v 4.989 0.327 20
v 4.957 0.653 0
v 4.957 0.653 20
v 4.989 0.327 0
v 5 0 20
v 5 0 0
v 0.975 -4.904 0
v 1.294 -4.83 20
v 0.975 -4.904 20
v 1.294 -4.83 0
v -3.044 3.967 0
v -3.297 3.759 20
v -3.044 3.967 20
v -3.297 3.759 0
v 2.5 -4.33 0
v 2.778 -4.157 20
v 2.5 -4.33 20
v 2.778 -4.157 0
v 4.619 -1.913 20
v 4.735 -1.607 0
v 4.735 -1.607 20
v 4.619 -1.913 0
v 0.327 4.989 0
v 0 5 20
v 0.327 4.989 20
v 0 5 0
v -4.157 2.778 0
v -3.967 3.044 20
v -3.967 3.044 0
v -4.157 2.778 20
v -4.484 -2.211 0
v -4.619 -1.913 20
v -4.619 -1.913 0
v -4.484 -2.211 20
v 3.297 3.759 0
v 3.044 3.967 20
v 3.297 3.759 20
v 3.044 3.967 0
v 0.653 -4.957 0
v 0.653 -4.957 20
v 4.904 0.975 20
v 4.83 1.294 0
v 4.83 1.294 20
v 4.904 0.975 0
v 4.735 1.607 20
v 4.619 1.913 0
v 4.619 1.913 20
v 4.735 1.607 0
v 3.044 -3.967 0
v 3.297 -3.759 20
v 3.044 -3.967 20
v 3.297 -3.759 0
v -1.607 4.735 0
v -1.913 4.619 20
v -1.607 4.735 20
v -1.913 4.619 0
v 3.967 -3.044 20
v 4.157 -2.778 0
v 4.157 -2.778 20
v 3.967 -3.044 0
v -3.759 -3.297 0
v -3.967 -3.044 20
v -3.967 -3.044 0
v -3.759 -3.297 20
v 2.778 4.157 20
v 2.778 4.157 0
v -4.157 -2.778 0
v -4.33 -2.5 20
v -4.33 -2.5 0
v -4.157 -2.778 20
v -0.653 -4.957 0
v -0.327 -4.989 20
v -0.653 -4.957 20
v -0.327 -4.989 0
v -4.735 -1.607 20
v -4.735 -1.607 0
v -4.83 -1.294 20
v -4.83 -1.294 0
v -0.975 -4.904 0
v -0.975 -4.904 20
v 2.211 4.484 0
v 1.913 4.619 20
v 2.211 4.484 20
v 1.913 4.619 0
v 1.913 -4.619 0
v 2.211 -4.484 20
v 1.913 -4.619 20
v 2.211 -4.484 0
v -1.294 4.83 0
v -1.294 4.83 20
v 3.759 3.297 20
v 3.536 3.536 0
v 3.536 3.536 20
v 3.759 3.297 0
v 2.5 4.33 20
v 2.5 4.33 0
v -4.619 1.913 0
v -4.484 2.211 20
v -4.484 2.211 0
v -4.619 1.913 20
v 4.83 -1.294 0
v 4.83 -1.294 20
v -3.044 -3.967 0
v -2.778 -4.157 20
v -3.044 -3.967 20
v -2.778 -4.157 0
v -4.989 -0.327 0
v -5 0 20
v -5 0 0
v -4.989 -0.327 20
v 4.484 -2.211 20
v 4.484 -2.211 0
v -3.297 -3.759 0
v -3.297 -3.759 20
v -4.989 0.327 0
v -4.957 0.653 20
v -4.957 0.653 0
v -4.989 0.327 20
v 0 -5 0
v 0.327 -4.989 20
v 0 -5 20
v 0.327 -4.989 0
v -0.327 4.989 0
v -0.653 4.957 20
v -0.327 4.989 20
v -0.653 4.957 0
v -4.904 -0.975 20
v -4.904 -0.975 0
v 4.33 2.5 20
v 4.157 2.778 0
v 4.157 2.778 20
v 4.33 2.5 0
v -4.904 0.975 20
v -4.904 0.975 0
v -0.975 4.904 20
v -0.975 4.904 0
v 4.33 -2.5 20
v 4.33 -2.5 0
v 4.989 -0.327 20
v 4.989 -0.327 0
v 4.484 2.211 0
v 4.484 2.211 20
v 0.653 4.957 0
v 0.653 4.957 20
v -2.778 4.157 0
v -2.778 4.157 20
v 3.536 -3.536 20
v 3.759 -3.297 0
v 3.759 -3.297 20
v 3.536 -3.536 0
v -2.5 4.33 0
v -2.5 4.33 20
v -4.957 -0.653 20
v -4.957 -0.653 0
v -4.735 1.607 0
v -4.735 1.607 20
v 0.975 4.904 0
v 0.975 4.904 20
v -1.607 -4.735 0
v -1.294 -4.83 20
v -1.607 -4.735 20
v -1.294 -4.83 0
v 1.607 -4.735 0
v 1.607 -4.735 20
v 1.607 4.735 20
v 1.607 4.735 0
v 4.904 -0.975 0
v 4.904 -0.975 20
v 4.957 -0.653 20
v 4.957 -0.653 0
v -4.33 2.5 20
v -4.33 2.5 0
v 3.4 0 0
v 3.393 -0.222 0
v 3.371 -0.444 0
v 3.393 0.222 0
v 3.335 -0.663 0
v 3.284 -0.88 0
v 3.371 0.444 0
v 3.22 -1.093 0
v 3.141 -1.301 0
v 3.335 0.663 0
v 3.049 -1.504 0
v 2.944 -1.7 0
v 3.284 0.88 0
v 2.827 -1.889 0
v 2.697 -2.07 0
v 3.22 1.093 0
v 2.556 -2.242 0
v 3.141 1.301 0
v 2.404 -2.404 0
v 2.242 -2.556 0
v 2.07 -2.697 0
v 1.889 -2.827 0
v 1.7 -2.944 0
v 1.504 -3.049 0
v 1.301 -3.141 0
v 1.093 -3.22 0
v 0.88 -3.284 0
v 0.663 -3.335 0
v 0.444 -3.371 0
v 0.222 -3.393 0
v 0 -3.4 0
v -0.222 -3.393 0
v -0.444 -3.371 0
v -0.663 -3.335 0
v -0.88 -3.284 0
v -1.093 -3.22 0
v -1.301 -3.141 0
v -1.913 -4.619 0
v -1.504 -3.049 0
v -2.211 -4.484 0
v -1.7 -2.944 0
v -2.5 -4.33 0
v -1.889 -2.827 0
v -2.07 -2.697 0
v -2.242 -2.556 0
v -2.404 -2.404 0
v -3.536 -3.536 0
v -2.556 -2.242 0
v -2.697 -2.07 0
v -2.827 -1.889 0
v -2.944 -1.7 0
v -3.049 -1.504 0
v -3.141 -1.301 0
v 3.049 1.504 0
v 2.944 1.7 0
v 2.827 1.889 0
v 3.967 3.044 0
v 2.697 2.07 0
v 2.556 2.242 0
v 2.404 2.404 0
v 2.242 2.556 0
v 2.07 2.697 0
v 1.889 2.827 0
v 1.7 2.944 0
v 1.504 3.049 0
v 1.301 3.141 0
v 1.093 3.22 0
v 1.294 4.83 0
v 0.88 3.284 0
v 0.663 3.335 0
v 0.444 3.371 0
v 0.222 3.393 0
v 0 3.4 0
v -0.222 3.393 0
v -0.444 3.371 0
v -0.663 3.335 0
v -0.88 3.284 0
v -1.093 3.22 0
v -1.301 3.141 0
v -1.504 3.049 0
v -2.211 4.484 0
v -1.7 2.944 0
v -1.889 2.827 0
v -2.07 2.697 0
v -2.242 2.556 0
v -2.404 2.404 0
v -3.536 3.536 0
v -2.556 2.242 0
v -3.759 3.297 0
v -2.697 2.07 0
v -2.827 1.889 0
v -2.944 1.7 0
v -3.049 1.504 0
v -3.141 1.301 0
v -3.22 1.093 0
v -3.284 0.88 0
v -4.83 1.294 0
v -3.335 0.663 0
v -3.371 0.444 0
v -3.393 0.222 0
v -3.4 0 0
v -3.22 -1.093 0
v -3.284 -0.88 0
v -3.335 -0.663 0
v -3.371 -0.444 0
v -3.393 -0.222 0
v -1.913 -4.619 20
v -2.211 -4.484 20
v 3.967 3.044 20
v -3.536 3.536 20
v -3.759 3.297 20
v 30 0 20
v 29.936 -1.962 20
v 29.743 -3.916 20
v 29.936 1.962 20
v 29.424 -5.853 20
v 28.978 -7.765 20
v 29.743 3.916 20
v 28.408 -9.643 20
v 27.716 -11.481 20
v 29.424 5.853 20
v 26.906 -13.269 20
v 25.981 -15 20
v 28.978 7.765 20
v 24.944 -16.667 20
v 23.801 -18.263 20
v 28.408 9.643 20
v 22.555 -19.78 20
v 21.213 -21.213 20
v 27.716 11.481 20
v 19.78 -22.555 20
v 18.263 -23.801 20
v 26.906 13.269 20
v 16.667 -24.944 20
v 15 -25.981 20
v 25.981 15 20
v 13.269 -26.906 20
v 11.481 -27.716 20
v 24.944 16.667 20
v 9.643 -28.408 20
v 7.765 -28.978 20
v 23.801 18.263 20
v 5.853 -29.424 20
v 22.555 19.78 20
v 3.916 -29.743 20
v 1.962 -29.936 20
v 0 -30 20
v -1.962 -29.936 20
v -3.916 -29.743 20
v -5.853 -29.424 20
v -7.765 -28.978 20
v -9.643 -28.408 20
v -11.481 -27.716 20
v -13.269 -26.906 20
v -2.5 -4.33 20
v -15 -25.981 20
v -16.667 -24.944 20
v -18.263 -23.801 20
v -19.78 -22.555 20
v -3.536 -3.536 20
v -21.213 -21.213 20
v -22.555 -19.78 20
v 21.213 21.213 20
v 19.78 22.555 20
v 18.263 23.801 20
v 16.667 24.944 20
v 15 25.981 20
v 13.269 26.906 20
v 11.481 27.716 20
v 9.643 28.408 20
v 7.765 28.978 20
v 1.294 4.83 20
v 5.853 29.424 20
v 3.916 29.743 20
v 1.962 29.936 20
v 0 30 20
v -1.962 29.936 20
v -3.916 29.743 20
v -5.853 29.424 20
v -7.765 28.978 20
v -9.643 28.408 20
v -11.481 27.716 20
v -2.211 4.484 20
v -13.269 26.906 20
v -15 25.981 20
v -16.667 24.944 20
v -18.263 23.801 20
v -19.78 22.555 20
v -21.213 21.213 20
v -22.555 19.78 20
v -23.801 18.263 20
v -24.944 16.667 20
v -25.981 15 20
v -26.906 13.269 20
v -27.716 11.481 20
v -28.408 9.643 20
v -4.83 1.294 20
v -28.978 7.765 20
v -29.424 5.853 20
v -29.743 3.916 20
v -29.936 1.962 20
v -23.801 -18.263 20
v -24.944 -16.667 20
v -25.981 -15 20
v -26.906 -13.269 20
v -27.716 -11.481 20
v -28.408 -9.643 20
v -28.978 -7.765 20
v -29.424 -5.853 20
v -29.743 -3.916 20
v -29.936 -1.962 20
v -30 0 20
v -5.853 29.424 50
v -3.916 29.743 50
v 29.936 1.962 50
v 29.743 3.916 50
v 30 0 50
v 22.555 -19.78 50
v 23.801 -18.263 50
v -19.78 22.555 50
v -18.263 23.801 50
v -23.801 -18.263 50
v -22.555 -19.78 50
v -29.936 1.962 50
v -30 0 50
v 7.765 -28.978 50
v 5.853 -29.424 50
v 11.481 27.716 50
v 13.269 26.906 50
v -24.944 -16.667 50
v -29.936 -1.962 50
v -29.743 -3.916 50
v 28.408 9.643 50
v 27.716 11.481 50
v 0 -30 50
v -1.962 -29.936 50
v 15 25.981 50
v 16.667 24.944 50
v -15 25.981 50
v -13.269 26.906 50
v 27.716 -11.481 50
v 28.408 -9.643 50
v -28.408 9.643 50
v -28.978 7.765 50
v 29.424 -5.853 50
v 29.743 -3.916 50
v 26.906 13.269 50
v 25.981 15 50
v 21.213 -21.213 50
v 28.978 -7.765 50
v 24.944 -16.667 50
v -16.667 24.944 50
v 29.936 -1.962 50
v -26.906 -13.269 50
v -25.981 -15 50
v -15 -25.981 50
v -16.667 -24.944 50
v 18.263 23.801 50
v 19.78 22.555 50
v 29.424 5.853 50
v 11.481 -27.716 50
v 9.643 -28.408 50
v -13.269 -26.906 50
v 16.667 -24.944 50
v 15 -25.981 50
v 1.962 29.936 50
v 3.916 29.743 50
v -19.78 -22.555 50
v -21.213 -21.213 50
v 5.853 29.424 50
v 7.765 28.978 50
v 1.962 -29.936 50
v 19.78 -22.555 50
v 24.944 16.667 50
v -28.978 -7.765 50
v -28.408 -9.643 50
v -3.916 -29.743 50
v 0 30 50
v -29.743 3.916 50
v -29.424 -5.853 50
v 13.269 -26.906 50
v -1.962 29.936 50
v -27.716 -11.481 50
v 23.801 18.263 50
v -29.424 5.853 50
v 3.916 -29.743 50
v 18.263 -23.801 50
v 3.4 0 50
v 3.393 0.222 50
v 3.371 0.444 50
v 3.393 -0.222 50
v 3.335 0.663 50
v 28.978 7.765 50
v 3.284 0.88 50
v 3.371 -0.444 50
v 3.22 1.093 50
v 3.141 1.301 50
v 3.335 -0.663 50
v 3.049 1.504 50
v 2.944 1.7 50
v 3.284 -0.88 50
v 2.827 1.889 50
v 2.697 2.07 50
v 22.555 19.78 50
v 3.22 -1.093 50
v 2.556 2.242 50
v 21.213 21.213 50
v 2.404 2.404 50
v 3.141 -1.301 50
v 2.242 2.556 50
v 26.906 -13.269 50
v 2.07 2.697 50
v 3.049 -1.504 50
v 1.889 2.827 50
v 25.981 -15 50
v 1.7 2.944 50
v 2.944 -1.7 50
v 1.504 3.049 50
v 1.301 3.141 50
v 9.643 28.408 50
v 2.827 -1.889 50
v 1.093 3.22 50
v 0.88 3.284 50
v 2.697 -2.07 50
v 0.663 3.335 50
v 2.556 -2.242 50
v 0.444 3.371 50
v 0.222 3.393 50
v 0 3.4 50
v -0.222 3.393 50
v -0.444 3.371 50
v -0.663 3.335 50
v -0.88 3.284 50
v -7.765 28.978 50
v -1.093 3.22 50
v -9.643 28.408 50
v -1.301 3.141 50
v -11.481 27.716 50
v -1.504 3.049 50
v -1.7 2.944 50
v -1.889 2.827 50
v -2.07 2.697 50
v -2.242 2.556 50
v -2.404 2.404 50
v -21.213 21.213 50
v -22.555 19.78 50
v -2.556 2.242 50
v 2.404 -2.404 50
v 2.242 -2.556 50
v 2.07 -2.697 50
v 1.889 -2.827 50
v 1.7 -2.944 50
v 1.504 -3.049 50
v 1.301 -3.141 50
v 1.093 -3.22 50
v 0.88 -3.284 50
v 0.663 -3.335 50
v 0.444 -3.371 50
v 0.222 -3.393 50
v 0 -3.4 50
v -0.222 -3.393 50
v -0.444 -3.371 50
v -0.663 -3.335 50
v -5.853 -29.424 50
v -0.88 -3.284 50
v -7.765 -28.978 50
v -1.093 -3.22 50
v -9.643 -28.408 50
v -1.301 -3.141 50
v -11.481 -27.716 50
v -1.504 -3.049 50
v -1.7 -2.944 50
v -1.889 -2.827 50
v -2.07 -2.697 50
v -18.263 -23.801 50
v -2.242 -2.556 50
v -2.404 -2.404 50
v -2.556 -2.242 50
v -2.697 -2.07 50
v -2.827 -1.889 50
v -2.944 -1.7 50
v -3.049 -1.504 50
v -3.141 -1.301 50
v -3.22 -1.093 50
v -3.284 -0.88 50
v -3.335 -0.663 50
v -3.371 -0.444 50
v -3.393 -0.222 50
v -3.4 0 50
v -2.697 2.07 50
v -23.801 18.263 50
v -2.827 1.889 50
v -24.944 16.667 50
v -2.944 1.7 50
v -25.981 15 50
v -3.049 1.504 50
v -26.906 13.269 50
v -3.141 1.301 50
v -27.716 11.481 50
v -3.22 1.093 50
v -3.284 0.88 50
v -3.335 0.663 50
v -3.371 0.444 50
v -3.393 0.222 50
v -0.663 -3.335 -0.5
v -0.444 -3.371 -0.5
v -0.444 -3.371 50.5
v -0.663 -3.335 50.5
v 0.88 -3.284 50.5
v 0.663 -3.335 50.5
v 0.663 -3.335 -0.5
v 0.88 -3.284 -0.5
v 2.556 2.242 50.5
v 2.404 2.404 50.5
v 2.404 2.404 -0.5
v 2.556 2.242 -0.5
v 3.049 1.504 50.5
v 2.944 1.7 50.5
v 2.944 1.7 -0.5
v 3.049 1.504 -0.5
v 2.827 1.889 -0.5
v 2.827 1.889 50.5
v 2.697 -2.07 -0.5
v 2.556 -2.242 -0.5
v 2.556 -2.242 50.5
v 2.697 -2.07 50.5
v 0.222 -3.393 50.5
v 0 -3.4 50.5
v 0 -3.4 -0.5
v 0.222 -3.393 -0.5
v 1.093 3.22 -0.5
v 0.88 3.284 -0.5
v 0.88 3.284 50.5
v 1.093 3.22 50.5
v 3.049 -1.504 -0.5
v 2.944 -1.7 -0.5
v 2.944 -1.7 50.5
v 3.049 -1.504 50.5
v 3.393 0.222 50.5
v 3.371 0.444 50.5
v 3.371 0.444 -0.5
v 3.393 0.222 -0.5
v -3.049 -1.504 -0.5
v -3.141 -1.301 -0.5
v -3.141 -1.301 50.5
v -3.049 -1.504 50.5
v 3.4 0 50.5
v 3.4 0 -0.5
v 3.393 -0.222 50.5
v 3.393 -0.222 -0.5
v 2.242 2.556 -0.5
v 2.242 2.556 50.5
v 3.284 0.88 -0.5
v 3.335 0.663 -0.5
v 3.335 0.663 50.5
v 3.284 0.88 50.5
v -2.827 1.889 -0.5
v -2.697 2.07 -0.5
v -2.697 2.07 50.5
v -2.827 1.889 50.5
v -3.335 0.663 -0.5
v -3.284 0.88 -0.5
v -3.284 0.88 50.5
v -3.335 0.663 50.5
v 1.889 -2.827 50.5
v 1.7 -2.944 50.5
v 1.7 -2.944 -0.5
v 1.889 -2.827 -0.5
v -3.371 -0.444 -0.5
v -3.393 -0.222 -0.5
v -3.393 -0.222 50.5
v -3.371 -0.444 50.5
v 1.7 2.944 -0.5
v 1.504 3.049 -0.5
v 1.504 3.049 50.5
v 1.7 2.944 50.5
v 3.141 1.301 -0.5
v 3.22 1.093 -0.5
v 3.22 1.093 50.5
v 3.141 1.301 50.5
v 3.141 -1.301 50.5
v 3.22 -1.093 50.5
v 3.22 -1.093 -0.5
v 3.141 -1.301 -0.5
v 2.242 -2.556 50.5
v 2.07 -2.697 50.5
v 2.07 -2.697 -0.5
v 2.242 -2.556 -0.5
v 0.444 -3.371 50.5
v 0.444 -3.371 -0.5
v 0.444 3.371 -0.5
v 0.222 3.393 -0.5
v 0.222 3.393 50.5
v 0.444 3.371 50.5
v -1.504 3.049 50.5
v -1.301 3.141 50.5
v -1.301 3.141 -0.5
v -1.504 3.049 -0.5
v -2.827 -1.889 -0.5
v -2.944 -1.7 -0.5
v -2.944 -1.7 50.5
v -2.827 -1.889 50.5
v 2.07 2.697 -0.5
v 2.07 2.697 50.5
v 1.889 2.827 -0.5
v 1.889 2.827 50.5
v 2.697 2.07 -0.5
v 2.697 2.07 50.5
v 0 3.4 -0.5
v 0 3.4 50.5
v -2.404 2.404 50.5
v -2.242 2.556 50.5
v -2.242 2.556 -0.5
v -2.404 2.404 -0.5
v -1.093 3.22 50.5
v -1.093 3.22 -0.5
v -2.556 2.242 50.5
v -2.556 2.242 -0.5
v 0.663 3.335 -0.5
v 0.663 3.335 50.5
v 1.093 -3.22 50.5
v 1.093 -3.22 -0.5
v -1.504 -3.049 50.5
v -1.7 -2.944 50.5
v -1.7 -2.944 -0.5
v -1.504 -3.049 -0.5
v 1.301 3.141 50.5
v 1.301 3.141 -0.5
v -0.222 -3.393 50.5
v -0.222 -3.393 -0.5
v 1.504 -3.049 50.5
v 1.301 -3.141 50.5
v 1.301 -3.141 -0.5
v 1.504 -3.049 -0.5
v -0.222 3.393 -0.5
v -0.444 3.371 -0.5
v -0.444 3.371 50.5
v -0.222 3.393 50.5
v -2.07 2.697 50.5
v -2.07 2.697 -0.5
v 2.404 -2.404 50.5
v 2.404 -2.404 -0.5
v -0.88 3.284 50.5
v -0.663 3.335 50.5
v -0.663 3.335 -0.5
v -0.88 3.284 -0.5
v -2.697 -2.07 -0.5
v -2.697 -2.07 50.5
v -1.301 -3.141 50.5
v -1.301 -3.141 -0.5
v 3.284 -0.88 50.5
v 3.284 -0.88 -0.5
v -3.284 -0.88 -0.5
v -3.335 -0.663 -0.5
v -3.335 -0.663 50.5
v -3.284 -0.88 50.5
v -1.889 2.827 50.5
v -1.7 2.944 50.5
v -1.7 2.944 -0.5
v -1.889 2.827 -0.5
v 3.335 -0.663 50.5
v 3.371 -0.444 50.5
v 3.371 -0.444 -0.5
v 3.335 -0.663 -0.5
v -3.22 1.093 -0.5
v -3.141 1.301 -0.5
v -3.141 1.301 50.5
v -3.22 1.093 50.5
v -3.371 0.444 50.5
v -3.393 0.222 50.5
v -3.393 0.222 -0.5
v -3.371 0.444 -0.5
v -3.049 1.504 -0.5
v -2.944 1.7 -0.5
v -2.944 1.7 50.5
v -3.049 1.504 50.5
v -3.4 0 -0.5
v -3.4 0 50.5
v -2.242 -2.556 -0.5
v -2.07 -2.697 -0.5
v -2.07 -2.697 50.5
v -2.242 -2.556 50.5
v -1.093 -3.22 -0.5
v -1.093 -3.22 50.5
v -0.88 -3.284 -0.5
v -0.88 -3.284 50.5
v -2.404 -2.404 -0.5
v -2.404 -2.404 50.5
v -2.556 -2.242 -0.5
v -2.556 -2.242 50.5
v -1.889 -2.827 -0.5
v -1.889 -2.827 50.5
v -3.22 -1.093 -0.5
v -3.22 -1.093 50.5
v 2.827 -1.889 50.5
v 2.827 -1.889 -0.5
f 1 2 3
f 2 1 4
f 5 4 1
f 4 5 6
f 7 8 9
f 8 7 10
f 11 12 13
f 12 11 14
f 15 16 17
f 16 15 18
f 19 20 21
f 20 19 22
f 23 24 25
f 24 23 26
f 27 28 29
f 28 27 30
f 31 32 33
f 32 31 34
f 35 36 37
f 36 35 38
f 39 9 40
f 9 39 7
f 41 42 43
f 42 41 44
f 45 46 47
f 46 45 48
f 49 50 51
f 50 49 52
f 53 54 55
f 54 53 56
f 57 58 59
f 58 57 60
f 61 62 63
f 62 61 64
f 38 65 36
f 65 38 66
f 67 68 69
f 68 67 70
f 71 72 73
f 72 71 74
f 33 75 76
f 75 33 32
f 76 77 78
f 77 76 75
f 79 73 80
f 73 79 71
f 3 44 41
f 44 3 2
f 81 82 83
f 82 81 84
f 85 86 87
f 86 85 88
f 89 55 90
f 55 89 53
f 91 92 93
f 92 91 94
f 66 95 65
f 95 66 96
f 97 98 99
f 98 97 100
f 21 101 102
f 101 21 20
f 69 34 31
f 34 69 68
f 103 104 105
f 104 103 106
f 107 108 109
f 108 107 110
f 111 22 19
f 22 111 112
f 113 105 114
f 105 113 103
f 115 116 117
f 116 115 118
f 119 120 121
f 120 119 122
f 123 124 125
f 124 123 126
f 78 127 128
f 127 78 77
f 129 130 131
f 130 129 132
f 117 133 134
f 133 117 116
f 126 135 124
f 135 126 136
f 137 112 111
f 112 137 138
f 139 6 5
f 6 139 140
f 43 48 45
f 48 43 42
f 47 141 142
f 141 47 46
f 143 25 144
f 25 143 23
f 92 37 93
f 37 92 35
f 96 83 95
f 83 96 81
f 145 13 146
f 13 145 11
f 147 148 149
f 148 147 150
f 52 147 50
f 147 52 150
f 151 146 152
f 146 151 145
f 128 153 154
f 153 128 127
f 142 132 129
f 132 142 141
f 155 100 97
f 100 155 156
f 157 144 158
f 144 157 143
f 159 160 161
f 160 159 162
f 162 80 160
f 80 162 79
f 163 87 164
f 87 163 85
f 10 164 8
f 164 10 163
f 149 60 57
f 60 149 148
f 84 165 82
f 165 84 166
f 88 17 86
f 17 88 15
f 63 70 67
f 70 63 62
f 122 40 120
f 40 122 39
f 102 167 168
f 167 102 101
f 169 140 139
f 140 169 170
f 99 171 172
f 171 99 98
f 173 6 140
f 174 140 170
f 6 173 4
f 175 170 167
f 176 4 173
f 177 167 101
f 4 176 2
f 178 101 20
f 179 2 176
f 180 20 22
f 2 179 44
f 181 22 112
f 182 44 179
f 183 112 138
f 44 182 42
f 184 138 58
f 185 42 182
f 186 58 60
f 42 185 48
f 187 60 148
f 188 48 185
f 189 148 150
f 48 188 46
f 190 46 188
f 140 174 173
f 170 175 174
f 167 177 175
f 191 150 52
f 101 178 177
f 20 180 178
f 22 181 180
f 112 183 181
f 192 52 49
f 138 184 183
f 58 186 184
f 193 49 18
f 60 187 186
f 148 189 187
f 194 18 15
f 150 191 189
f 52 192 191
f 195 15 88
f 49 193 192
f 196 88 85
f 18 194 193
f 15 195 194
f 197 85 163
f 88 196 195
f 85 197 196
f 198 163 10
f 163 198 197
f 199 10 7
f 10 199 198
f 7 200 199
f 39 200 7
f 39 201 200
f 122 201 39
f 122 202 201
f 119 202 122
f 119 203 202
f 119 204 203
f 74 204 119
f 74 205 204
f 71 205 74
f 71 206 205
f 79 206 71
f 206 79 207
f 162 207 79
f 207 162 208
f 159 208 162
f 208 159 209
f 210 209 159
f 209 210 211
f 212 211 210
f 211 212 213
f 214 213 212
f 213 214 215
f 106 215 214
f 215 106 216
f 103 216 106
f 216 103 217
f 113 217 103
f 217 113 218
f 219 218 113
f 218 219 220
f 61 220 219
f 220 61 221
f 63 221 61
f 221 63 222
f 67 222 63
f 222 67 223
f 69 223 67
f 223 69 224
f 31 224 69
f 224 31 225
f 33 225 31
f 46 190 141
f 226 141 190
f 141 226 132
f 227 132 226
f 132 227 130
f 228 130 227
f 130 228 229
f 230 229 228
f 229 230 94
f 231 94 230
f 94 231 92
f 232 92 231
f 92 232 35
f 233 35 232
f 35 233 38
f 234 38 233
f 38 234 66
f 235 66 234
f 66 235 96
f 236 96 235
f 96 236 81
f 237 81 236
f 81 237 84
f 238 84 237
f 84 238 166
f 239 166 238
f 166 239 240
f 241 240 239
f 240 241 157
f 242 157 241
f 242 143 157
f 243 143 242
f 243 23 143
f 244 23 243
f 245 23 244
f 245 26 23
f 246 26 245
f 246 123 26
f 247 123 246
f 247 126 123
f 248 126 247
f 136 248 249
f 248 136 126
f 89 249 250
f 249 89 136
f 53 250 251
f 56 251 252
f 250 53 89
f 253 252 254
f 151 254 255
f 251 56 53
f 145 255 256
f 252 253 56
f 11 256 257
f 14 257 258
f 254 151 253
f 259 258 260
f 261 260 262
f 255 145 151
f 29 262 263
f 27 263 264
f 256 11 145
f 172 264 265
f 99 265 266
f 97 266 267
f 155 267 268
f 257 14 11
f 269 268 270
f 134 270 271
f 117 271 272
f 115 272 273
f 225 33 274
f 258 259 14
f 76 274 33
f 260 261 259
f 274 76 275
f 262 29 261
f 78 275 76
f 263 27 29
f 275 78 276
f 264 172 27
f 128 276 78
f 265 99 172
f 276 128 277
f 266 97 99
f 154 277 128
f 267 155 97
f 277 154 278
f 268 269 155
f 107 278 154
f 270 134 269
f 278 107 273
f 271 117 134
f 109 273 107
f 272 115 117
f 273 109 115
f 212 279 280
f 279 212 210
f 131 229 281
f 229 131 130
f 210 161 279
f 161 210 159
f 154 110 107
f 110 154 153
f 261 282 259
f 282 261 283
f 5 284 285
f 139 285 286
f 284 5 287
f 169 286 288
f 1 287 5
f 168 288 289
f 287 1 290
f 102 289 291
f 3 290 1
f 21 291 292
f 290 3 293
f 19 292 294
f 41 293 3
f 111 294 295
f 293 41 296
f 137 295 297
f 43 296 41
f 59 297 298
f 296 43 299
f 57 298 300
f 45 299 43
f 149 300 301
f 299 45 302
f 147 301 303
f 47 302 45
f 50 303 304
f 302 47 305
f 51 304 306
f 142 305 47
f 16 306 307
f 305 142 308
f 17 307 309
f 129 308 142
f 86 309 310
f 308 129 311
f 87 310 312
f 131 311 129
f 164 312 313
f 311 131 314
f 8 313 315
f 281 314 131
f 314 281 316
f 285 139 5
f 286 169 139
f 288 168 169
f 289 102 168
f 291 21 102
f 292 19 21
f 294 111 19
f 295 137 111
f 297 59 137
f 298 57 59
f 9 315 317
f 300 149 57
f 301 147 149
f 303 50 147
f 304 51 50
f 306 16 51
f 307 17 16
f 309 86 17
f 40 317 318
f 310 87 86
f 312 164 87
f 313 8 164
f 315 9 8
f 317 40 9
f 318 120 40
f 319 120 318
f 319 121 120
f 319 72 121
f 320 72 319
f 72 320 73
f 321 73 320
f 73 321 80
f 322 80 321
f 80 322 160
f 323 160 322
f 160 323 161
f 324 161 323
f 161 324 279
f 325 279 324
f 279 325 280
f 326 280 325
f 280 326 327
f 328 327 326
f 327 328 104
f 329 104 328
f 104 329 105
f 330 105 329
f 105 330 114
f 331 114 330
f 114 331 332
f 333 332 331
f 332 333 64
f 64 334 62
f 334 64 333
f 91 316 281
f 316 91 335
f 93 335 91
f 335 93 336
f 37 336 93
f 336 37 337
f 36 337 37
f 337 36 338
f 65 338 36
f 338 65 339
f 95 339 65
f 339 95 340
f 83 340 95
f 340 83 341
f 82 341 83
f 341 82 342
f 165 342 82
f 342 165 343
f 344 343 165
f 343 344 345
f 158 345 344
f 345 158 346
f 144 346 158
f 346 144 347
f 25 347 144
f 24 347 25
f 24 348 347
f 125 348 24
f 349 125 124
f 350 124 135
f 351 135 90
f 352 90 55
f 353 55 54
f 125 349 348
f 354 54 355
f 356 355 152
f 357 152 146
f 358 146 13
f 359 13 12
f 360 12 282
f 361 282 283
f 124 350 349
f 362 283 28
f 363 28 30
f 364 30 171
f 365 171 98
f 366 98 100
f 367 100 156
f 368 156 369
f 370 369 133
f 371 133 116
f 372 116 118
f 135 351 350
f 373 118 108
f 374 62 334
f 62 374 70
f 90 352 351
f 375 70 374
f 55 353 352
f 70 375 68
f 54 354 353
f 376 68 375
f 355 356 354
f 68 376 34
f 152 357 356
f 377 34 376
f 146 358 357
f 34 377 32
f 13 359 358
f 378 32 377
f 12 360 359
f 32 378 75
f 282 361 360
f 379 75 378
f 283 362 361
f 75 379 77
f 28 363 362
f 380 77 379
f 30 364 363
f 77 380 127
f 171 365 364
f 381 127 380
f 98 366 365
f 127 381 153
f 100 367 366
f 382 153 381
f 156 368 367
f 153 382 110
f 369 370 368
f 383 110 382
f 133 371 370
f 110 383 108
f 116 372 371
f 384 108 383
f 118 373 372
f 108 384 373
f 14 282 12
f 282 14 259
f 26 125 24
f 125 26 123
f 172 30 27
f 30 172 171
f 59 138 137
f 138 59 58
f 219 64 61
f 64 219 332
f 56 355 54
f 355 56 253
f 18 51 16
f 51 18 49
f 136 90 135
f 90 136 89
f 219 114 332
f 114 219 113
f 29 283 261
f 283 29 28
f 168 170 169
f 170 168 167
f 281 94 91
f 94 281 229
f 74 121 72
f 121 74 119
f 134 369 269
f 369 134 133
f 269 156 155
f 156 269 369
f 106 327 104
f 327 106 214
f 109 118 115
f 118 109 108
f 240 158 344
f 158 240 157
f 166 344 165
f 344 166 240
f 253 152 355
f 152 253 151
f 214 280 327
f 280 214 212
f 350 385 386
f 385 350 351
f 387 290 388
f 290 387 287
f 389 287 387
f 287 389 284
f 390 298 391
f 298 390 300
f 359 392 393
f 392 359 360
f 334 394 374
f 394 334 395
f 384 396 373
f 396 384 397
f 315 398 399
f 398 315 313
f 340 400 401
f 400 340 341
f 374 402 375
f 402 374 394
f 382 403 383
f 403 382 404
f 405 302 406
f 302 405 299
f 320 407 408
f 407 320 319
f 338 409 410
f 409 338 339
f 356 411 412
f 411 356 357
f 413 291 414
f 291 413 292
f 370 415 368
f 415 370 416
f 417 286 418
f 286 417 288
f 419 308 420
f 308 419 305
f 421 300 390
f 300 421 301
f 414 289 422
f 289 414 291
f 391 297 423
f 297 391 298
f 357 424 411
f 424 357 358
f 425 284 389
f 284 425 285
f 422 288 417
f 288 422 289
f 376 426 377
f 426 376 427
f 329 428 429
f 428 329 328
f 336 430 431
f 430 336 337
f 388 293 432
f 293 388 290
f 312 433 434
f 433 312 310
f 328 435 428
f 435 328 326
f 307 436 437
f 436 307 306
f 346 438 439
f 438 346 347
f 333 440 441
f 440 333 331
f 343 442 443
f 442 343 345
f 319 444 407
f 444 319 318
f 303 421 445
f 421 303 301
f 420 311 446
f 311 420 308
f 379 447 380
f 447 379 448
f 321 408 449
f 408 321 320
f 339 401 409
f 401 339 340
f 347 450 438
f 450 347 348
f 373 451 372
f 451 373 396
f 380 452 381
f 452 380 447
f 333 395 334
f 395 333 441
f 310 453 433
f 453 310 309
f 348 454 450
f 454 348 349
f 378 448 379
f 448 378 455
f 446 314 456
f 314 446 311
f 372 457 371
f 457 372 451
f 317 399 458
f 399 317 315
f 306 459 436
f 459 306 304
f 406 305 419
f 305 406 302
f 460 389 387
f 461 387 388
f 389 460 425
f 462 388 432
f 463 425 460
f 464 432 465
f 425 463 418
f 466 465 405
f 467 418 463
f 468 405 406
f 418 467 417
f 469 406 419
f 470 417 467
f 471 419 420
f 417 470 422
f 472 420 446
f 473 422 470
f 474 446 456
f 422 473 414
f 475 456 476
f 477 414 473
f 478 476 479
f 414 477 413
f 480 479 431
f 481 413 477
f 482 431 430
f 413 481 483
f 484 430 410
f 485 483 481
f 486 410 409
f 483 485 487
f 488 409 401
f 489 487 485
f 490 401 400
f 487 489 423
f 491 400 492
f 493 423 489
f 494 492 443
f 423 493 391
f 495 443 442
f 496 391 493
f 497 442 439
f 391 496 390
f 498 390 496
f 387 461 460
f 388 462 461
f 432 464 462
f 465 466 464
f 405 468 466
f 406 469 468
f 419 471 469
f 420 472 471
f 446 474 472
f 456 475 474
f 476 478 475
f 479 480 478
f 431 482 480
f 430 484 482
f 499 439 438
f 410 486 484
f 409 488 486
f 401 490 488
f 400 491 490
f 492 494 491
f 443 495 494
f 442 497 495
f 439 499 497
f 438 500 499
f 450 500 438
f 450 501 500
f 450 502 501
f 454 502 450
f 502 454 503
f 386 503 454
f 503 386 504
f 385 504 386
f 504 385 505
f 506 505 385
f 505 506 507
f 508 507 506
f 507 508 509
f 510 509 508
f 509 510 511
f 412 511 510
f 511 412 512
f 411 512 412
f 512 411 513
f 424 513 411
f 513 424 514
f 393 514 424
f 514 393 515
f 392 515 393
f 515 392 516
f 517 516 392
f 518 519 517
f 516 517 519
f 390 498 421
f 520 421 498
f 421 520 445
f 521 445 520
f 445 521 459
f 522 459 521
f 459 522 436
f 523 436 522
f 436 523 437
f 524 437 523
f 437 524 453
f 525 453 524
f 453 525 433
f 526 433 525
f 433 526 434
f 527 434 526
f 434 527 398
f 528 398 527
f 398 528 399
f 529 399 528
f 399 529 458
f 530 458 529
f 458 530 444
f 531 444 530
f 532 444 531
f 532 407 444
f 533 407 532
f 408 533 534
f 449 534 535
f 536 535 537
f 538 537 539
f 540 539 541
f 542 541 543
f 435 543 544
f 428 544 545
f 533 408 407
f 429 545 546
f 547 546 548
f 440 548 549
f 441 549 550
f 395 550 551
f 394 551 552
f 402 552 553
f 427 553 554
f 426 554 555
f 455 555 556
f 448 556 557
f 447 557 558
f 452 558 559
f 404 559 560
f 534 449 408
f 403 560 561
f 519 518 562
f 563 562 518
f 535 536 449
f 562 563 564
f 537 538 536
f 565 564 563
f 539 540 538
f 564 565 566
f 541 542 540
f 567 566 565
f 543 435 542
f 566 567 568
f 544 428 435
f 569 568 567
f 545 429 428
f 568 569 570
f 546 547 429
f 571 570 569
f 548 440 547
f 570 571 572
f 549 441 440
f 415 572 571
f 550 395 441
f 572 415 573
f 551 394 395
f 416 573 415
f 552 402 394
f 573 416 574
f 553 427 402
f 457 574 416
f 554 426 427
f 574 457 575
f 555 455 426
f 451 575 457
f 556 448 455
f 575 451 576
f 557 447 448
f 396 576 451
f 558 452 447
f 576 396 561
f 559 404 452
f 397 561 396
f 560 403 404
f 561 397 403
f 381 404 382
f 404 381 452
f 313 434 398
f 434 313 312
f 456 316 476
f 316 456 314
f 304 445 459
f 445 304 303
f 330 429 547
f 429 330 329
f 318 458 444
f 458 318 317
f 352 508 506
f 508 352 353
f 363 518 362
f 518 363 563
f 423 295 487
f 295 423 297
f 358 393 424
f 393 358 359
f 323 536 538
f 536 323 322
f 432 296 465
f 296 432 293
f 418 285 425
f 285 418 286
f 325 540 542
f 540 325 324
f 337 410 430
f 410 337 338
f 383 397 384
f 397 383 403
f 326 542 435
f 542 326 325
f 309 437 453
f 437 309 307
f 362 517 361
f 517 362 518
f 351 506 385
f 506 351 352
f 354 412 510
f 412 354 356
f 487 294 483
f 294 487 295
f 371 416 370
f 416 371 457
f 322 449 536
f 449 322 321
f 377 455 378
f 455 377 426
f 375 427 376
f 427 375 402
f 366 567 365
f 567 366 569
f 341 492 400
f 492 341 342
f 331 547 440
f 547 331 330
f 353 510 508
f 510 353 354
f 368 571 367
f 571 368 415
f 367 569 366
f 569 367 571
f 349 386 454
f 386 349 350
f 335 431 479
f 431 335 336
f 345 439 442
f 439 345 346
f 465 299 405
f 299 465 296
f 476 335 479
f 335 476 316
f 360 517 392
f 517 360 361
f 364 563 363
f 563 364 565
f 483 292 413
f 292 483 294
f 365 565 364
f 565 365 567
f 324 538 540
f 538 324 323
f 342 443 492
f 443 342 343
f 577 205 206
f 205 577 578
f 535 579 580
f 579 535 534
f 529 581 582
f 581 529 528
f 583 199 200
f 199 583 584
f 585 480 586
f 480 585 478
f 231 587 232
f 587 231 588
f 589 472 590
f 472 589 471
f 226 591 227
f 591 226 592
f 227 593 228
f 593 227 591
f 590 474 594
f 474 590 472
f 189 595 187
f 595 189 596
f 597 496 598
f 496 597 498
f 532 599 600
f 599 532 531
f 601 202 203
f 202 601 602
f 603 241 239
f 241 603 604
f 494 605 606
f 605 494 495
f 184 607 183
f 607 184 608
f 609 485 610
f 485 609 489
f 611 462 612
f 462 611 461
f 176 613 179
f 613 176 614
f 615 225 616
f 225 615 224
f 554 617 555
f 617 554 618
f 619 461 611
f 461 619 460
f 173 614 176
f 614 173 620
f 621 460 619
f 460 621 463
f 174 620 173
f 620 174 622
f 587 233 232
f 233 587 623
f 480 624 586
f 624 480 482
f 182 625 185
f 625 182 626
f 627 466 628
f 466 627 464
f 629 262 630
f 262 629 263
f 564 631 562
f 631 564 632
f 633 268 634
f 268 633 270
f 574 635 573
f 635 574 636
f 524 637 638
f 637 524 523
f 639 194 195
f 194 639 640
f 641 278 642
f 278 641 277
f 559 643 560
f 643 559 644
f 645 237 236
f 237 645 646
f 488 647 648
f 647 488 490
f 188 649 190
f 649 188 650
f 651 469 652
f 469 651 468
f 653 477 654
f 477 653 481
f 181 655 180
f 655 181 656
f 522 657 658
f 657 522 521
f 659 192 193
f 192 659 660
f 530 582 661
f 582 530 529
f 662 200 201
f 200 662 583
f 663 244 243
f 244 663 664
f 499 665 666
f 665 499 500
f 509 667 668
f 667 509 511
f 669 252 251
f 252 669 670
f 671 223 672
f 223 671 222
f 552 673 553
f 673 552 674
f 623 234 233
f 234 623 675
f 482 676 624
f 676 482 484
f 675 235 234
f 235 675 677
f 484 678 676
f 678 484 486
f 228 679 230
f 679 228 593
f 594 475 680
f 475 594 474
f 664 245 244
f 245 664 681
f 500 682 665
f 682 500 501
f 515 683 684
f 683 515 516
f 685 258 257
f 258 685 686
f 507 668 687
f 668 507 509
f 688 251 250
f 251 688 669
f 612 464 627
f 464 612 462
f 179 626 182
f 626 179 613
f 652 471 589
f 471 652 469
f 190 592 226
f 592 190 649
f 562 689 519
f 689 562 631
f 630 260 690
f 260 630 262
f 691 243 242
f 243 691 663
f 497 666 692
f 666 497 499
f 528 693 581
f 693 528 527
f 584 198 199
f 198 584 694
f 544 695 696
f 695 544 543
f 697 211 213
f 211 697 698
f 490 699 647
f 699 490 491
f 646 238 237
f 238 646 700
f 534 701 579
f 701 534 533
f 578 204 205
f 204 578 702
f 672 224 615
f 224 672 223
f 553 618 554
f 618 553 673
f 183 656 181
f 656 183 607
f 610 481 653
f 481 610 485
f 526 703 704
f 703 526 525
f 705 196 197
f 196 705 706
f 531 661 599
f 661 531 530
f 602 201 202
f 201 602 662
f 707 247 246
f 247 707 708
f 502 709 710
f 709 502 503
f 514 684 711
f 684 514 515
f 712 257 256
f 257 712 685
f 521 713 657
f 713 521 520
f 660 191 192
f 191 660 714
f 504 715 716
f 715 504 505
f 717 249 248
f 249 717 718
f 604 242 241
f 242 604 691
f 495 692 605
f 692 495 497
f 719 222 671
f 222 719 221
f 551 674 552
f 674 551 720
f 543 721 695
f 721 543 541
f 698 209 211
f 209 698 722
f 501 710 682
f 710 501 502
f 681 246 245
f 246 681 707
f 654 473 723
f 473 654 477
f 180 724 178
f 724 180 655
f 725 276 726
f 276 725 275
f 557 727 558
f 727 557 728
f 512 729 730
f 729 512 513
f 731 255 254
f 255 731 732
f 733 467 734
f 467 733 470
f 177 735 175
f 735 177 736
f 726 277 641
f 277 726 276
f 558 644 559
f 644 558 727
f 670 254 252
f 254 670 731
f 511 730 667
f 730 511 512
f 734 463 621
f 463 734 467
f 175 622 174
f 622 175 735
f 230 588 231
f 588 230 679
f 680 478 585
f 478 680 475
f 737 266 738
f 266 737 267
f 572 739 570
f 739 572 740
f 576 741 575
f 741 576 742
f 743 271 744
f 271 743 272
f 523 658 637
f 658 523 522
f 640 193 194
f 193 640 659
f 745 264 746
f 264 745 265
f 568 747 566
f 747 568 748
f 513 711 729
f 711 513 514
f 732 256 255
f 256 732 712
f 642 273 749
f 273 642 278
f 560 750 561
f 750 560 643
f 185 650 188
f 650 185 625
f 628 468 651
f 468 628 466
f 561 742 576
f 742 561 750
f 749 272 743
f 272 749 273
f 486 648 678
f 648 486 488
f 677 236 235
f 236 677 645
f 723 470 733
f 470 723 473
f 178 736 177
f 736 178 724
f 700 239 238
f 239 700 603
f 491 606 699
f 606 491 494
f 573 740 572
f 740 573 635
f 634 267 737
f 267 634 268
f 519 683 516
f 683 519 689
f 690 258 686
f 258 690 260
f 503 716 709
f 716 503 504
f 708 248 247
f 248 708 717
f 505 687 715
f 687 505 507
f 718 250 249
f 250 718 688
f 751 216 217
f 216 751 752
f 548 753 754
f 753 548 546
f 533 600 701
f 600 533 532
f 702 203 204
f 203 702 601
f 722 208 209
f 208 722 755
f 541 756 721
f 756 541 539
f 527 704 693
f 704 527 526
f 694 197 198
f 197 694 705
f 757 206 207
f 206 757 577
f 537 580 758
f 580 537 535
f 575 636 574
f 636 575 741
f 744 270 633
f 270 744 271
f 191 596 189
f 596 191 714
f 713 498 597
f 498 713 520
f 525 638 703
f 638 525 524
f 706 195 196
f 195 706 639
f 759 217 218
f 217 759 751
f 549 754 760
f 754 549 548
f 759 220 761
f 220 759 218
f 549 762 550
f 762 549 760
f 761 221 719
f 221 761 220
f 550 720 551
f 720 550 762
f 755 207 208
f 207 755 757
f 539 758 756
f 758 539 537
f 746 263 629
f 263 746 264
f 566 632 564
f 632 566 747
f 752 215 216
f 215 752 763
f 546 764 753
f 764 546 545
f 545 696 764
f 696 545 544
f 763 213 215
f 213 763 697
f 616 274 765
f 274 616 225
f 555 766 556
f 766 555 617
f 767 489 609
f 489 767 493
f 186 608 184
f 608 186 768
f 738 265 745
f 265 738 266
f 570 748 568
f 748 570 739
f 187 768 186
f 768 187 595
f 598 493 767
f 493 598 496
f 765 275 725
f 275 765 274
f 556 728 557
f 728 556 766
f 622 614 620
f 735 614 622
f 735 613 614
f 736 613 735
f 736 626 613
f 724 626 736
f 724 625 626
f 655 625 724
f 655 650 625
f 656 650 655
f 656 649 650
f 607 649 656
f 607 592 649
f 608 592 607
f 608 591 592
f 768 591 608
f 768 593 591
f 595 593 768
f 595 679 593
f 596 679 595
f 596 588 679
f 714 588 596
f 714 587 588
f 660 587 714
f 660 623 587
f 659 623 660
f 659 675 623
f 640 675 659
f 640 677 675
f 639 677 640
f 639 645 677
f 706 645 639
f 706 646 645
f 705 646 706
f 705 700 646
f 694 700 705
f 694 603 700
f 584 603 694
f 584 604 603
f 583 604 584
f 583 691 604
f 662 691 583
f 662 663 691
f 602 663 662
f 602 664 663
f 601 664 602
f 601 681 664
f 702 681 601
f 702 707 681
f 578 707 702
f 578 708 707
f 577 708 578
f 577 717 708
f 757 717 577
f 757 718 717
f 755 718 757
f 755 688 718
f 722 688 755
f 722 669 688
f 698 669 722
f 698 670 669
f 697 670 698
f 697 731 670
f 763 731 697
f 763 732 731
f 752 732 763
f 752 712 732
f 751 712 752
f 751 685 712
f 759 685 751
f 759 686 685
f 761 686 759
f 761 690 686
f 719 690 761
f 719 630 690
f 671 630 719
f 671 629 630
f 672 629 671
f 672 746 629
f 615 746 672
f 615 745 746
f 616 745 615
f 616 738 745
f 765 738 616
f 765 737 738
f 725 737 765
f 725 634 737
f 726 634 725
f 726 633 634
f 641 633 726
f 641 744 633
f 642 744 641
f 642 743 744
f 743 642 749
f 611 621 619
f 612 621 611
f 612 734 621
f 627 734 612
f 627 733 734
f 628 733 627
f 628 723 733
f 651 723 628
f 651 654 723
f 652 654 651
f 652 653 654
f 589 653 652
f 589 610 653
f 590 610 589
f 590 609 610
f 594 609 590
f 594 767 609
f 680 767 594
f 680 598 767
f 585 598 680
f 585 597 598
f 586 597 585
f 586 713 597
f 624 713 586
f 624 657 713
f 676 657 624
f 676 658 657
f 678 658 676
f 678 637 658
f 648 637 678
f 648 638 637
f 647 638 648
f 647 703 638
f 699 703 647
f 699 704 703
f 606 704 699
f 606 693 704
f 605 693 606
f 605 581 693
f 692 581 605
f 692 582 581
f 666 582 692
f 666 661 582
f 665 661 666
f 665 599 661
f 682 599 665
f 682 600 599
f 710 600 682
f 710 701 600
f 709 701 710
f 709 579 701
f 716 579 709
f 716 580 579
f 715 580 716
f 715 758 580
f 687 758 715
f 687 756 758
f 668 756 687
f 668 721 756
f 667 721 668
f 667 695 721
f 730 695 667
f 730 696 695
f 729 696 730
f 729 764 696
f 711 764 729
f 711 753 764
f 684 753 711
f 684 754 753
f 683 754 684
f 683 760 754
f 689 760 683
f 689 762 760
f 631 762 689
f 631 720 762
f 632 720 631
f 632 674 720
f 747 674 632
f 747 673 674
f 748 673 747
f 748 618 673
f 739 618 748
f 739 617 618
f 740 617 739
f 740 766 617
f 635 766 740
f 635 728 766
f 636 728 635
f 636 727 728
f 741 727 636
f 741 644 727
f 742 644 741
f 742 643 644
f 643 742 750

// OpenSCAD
// Funnel printed upright: spout at bottom (z=0), cone on top, open both ends
// Units: mm. Wall thickness: 1.6 mm.

$fn = 96;

// ---- Dimensions ----
spout_od      = 10;     // spout outer diameter
spout_id      = spout_od - 2 * 1.6;  // spout bore (6.8 mm)
spout_len     = 20;     // spout length (z=0 to z=20)
cone_d0       = 10;     // cone outer diameter at z=20 (same as spout top)
cone_d1       = 60;     // cone outer diameter at rim (z=50)
cone_h        = 30;     // cone height (z=20 to z=50)
eps           = 0.5;    // cutter overshoot past faces

// ---- Model ----
union() {
    // Spout (tube)
    translate([0, 0, 0])
        cylinder(h = spout_len, d = spout_od);

    // Cone (wider at top, open at both ends)
    translate([0, 0, spout_len])
        linear_extrude(cone_h)
            circle(d = cone_d1);
}

// Cut the bore through the full length so liquid runs straight through
translate([0, 0, -eps])
    cylinder(h = spout_len + cone_h + 2 * eps, d = spout_id);
